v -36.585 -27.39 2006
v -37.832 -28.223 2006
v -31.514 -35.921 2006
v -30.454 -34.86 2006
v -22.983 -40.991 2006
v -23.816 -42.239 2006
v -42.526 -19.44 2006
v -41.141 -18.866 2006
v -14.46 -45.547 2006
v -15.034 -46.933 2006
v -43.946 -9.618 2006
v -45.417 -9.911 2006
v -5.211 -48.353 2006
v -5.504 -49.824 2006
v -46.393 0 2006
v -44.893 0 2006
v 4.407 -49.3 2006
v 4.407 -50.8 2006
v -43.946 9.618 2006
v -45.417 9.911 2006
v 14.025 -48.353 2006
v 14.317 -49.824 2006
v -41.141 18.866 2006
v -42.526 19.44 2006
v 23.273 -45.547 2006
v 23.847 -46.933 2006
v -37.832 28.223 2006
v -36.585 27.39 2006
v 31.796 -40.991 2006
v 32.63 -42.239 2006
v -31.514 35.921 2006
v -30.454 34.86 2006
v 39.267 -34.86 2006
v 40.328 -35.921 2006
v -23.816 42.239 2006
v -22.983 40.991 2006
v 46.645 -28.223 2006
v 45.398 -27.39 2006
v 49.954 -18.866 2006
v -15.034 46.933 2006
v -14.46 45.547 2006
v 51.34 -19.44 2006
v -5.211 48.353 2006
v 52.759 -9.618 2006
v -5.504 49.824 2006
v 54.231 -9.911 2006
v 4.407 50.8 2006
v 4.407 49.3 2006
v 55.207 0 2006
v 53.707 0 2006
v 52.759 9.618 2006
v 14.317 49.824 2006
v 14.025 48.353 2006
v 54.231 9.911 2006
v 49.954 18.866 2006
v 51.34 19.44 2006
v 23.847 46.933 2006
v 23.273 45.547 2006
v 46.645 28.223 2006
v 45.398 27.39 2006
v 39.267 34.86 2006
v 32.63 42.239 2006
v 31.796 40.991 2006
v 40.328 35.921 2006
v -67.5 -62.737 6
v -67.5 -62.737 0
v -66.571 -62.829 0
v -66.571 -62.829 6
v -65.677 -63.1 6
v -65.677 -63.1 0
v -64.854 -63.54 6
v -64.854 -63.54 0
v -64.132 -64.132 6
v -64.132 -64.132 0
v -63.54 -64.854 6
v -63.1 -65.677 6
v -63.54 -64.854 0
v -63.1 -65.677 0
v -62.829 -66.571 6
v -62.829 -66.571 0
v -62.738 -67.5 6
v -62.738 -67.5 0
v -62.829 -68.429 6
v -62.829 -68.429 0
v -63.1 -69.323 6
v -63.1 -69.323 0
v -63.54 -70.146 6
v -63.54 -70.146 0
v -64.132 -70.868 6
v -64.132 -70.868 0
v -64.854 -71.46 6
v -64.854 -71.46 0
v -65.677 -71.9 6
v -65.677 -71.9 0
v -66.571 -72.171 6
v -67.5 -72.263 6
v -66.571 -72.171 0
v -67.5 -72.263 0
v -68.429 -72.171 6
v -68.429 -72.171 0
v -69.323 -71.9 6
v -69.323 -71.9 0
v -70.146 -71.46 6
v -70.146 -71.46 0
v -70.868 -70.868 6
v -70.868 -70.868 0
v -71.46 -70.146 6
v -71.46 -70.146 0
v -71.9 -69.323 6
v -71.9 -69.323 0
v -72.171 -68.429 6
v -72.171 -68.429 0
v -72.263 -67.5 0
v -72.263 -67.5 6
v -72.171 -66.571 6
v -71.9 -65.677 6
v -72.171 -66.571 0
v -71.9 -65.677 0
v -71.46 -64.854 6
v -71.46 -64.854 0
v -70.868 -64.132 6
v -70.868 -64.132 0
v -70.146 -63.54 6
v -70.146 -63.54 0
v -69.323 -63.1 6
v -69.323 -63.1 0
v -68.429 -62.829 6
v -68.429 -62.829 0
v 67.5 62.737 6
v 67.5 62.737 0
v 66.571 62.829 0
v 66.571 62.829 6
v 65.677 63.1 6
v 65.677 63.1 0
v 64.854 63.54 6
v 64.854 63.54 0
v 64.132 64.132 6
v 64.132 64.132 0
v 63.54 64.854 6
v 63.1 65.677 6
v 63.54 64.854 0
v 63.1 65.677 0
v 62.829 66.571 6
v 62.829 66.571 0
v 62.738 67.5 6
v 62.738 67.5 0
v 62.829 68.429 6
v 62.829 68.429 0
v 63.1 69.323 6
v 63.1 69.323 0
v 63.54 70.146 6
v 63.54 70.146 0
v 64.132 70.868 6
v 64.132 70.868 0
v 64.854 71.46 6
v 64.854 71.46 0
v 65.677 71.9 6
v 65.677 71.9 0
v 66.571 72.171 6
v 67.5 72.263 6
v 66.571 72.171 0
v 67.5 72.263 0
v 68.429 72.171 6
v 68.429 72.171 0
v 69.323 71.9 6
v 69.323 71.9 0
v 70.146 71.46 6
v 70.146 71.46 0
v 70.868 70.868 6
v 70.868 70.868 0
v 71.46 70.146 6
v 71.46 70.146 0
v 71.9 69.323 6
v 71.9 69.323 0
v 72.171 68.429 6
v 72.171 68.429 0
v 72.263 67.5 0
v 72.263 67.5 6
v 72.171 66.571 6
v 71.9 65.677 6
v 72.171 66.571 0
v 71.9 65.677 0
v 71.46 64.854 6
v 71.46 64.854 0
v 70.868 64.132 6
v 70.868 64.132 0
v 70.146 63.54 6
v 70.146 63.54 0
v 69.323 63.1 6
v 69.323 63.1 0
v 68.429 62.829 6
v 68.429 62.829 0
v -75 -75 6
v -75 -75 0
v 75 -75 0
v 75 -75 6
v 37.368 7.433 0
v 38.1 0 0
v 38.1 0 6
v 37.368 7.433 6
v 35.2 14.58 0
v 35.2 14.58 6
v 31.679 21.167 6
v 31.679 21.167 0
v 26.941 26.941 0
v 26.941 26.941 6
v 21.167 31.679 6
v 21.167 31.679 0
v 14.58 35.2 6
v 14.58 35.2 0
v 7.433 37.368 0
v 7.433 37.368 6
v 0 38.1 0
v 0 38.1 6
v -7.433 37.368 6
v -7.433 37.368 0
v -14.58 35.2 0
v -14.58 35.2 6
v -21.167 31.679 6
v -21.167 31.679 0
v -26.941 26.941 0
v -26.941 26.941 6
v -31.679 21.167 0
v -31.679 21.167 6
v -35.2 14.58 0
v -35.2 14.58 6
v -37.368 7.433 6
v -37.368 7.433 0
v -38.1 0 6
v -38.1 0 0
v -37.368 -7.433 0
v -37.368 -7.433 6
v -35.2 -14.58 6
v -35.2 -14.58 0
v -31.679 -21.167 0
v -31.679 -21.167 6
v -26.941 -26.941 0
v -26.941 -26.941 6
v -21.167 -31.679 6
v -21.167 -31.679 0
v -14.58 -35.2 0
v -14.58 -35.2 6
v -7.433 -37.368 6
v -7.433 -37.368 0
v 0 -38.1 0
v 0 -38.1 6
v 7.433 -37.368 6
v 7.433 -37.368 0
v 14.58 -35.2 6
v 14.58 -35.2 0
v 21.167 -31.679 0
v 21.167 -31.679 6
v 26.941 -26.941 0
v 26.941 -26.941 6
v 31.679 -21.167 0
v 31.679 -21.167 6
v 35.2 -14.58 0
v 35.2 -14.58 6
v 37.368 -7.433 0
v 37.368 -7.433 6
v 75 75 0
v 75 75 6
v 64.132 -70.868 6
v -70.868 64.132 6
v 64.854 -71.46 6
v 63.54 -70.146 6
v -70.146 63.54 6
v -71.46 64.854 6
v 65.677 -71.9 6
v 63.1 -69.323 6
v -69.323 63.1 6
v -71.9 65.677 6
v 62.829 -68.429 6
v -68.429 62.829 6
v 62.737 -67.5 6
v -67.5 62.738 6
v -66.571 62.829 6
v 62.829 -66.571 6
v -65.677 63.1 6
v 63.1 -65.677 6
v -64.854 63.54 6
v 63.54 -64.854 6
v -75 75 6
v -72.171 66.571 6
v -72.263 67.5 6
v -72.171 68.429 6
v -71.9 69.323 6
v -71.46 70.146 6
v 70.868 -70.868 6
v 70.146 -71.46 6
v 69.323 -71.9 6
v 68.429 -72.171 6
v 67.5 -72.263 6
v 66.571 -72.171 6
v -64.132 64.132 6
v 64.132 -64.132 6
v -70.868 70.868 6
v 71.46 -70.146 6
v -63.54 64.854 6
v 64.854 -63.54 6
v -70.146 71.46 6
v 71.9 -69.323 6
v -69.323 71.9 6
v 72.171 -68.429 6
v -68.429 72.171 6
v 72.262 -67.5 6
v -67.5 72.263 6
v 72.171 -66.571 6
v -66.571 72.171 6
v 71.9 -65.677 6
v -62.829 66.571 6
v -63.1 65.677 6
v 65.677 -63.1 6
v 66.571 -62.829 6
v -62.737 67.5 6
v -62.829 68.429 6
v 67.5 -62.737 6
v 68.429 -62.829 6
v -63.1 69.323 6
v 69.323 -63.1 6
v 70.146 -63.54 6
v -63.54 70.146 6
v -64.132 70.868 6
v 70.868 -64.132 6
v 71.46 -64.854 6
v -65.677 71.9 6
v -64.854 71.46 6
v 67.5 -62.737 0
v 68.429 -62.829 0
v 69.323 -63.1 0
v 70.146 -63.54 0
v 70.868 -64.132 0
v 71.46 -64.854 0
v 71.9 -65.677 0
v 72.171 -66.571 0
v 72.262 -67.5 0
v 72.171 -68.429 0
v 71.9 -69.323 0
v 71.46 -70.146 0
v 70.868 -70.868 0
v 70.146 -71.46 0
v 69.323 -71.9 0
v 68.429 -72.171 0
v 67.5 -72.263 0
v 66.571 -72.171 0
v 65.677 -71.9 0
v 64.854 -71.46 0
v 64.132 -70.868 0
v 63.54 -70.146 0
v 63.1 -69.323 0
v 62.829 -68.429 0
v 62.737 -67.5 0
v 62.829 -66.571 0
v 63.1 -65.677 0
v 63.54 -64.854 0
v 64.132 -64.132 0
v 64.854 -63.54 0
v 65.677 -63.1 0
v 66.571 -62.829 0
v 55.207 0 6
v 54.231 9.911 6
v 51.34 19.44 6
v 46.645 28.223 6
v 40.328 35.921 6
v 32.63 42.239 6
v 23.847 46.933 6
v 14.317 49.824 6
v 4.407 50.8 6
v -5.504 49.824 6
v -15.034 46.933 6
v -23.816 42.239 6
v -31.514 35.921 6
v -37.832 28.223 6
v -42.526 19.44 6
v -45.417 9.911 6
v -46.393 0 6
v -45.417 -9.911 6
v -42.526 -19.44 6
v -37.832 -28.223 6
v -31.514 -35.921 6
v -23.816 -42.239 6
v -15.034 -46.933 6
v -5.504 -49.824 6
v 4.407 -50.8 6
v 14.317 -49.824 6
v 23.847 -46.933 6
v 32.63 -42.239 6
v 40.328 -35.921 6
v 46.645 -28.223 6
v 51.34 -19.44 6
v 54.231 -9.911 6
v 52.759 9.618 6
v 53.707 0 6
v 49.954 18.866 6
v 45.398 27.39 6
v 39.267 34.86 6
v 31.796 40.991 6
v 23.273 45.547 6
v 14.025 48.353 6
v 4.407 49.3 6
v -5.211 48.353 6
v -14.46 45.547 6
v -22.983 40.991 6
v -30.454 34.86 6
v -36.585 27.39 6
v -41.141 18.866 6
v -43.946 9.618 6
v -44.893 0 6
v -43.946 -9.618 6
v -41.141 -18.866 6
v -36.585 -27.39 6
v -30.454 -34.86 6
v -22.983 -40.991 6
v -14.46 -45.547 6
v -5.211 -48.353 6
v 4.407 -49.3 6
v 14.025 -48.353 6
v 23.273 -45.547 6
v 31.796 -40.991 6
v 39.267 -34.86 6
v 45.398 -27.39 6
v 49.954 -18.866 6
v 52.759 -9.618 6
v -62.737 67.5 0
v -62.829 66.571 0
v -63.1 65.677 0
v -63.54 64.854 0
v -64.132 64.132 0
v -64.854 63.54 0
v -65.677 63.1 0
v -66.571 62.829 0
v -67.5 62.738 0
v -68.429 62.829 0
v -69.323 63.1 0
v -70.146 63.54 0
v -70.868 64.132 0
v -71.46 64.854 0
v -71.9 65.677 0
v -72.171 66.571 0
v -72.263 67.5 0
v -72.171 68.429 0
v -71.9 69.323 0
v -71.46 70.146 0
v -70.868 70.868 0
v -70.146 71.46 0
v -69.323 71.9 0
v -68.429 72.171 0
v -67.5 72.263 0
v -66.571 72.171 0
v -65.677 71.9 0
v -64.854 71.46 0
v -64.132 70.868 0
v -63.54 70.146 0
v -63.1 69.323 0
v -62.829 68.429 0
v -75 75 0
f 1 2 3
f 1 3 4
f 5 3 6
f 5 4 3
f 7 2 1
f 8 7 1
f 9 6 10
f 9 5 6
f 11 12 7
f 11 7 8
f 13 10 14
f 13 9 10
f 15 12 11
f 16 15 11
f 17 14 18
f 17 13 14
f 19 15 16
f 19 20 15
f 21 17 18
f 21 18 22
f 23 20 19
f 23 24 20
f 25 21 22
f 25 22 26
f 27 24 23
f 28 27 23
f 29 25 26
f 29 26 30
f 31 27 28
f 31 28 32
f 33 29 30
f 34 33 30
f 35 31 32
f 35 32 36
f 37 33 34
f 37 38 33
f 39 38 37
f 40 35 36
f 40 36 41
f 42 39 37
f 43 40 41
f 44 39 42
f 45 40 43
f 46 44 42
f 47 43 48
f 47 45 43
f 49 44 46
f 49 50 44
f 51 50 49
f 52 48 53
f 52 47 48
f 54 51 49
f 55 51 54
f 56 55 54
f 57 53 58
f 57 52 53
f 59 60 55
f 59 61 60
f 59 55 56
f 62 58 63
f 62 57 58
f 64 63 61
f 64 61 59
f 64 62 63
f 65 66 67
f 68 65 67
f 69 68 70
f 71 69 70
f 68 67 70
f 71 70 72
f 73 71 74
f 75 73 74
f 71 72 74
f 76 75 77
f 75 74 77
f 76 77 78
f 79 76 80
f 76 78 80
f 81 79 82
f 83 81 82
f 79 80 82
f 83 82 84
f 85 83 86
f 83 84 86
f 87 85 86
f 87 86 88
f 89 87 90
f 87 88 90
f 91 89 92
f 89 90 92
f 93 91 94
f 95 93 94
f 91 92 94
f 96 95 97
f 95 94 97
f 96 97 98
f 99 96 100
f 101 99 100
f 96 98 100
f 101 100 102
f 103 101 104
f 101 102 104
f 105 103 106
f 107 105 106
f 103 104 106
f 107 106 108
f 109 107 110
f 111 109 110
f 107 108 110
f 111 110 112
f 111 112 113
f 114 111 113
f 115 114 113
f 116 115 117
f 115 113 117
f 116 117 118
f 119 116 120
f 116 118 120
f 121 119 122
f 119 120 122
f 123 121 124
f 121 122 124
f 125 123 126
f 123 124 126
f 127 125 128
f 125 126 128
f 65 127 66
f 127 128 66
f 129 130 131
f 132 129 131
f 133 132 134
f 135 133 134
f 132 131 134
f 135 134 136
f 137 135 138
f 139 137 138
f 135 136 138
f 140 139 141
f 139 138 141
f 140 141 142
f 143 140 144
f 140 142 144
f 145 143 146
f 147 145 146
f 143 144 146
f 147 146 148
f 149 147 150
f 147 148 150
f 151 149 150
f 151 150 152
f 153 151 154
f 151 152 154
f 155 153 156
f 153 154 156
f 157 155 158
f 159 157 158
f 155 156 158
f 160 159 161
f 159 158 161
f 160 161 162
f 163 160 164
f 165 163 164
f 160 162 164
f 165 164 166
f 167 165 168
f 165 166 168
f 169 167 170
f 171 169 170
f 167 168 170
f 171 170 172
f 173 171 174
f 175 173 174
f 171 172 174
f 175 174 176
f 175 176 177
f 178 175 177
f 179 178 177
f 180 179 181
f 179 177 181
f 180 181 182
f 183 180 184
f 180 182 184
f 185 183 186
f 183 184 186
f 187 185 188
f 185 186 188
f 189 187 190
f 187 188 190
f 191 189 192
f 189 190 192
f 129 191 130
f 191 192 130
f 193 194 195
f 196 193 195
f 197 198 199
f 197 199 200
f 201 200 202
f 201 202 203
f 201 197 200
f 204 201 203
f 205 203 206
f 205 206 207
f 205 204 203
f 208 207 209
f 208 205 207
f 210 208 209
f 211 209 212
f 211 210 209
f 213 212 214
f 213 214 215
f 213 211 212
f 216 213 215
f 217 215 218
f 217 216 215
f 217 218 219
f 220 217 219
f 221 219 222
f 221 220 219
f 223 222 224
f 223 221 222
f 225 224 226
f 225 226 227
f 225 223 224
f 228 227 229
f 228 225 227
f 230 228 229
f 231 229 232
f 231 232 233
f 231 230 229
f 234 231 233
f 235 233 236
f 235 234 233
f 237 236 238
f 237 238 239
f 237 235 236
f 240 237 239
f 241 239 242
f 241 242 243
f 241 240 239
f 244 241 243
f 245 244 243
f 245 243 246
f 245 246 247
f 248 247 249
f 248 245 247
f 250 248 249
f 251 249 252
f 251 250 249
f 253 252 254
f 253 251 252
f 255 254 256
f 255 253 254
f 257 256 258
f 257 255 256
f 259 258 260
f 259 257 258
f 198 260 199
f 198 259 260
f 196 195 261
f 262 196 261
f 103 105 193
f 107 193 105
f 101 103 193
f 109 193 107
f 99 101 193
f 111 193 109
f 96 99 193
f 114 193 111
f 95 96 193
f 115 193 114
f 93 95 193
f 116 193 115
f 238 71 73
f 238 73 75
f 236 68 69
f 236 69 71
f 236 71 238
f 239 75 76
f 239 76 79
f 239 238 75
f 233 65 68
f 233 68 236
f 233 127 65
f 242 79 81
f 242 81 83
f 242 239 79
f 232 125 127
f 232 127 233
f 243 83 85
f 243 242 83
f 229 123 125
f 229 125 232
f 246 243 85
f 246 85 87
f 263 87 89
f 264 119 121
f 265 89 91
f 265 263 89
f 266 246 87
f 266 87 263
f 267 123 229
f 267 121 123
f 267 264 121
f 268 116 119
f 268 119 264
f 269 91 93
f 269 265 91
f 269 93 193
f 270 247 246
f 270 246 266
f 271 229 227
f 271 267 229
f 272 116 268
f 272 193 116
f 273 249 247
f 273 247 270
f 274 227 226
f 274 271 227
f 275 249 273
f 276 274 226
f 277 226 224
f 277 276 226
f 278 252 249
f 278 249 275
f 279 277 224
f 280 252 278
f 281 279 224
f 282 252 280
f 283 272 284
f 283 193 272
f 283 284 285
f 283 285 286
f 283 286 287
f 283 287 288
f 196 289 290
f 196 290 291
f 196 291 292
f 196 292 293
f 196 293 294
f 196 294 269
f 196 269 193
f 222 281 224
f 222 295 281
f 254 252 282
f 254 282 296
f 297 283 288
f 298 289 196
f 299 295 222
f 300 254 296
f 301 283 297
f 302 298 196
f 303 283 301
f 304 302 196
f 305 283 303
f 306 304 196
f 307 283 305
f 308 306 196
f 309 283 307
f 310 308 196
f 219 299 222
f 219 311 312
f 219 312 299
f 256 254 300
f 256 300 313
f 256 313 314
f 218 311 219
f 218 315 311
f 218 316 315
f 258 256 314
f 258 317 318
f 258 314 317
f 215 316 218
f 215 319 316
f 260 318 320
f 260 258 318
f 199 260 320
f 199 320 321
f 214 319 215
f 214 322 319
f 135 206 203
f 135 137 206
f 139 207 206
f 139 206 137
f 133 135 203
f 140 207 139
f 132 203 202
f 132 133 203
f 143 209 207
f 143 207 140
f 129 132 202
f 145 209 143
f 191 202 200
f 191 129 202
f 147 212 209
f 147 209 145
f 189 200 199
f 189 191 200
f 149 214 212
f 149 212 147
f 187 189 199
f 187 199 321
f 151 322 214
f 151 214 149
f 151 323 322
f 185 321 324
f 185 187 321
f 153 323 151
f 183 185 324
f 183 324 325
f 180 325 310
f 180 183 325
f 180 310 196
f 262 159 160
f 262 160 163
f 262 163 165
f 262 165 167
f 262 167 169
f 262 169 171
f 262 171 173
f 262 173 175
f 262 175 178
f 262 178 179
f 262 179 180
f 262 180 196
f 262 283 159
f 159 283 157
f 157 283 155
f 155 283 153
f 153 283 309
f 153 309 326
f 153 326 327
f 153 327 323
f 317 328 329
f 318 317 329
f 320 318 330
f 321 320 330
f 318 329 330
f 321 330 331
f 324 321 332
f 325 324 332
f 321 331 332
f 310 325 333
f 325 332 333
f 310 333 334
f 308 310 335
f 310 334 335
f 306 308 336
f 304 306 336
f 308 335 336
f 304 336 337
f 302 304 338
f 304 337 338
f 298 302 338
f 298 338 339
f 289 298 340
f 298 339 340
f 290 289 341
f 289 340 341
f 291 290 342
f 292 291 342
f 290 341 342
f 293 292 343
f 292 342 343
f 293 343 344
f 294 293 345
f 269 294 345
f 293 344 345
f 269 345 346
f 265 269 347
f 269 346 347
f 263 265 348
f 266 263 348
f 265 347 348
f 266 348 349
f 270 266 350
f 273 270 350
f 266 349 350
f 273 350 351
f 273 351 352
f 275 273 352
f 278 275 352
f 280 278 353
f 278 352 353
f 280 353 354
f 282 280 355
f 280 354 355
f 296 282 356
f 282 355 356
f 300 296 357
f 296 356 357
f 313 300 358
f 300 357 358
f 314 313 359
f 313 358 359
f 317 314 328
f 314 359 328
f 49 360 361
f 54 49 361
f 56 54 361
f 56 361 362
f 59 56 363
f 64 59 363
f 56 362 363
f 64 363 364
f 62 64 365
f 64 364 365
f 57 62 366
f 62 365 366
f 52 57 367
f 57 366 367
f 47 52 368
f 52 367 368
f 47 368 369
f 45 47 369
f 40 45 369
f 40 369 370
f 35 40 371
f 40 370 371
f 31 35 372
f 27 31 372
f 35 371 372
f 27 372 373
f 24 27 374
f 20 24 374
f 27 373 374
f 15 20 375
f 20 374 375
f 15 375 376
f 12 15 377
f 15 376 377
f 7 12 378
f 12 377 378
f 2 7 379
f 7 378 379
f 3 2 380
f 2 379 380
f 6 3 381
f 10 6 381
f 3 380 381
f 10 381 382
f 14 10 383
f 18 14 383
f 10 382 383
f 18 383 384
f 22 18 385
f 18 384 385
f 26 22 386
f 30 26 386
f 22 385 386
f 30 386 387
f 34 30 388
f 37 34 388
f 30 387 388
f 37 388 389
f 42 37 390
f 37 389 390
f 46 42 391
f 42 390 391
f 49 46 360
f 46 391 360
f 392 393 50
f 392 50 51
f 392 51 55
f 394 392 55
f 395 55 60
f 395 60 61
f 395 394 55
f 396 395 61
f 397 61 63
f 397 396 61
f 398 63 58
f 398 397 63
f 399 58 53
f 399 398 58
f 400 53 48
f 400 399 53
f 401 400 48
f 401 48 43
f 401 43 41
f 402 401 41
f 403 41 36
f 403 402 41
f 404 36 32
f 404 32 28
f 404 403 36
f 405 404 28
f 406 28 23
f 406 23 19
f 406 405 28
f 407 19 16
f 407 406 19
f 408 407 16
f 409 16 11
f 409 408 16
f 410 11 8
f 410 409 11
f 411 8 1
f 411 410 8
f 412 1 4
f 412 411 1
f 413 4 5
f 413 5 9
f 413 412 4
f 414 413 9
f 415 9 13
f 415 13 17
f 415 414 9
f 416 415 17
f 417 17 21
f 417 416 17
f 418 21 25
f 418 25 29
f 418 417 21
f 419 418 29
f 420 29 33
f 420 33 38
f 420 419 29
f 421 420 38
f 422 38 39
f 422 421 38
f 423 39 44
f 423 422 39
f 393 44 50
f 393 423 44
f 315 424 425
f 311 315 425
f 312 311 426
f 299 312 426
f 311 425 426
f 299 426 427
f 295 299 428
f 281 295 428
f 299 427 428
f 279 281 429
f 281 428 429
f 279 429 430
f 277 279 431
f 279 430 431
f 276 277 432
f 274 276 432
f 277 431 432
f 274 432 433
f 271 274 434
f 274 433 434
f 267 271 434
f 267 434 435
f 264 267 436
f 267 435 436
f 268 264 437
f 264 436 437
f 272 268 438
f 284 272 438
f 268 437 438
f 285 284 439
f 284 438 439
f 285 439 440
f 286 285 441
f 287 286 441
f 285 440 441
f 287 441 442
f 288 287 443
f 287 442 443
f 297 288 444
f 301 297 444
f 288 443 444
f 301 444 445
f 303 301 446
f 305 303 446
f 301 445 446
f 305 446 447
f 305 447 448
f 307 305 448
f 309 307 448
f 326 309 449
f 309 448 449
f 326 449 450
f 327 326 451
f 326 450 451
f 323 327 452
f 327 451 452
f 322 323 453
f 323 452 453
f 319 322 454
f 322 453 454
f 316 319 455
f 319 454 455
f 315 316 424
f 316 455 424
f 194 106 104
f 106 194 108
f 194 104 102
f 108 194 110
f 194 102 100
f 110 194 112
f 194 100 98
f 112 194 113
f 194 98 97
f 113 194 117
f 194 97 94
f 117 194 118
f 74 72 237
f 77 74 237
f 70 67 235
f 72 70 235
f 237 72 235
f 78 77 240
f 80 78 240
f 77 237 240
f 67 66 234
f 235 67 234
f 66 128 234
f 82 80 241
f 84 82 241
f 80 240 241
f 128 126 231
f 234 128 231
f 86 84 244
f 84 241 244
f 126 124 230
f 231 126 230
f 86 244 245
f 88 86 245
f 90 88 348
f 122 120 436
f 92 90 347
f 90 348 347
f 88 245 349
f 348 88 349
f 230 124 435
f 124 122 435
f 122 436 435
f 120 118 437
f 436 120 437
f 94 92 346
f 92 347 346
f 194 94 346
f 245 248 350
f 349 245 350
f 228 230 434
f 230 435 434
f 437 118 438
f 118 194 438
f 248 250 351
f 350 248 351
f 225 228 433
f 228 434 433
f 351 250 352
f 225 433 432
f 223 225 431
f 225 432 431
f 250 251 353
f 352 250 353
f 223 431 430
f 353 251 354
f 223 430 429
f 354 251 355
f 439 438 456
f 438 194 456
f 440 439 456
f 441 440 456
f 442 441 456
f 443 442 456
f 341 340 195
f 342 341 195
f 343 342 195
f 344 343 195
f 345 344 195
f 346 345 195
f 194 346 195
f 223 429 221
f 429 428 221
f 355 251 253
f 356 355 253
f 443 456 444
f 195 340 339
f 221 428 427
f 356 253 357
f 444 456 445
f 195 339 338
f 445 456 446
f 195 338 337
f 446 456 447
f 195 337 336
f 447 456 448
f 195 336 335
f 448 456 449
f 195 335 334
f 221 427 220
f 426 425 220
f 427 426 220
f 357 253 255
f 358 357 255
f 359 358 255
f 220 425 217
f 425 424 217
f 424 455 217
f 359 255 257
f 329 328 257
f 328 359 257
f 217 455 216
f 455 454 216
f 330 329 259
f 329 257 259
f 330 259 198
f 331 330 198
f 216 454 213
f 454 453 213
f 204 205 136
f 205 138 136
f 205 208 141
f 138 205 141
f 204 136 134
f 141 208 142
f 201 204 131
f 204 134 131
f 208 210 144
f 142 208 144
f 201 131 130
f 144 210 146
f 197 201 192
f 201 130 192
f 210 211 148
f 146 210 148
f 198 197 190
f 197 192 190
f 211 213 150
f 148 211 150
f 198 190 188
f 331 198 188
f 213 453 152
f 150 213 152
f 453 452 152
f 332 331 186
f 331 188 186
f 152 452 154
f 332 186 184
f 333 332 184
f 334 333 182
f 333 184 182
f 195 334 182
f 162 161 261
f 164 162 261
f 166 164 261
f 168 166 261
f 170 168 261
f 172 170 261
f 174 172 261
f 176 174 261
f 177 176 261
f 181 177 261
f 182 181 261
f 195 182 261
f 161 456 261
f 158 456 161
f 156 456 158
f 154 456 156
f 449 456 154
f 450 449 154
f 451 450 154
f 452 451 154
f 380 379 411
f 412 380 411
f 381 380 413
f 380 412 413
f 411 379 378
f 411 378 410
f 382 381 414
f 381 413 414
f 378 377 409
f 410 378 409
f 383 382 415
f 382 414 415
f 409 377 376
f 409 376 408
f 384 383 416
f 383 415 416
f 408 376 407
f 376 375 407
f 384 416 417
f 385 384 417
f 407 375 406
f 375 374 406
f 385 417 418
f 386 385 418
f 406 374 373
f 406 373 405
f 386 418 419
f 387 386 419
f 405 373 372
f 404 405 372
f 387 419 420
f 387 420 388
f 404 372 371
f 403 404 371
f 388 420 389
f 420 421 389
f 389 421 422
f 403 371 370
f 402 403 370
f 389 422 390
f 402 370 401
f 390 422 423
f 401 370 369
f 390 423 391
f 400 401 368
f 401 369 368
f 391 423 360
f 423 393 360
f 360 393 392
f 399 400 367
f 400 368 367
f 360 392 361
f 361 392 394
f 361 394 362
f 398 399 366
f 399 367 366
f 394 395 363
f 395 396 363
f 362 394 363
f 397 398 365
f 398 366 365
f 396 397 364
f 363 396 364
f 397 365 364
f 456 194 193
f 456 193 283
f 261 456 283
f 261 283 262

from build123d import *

# Parameters (mm, degrees)
F0_W     = 150
F0_H     = 150
F0_R     = 38.1
F1_DEPTH = 6
F0_R_2   = 4.7625
F2_R     = 50.8
F2_R_2   = 49.3
F4_DEPTH = 2000


with BuildPart() as f1:
    # F0 (on Top) → F1 (new body)
    with BuildSketch(Plane.XY):
        Rectangle(F0_W, F0_H)
        with BuildLine():
            Line((62.7375, -67.5), (-62.7375, -67.5))
            ThreePointArc((-62.7375, -67.5), (-70.8675960454, -70.8675960454), (-67.5, -62.7375))
            Line((-67.5, -62.7375), (-67.5, 62.7375))
            ThreePointArc((-67.5, 62.7375), (-70.8675960454, 70.8675960454), (-62.7375, 67.5))
            Line((-62.7375, 67.5), (62.7375, 67.5))
            ThreePointArc((62.7375, 67.5), (67.5, 72.2625), (72.2625, 67.5))
            ThreePointArc((72.2625, 67.5), (70.8675960454, 64.1324039546), (67.5, 62.7375))
            Line((67.5, 62.7375), (67.5, -62.7375))
            ThreePointArc((67.5, -62.7375), (70.8675960454, -64.1324039546), (72.2625, -67.5))
            ThreePointArc((72.2625, -67.5), (67.5, -72.2625), (62.7375, -67.5))
        make_face(mode=Mode.SUBTRACT)
        with BuildLine():
            ThreePointArc((-67.5, -62.7375), (-64.1324039546, -64.1324039546), (-62.7375, -67.5))
            Line((-62.7375, -67.5), (62.7375, -67.5))
            ThreePointArc((62.7375, -67.5), (64.1324039546, -64.1324039546), (67.5, -62.7375))
            Line((67.5, -62.7375), (67.5, 62.7375))
            ThreePointArc((67.5, 62.7375), (64.1324039546, 64.1324039546), (62.7375, 67.5))
            Line((62.7375, 67.5), (-62.7375, 67.5))
            ThreePointArc((-62.7375, 67.5), (-64.1324039546, 64.1324039546), (-67.5, 62.7375))
            Line((-67.5, 62.7375), (-67.5, -62.7375))
        make_face()
        Circle(F0_R, mode=Mode.SUBTRACT)
    extrude(amount=F1_DEPTH)


with BuildPart() as f1b:
    # F0 (on Top) → F1, piece 2 (new body)
    with BuildSketch(Plane.XY):
        with Locations((202.5, -67.5)):
            Circle(F0_R_2)
    extrude(amount=F1_DEPTH)


with BuildPart() as f4:
    # F2 (on face) → F4 (new body)
    with BuildSketch(Plane.XY.offset(6)):
        with Locations((4.4067243471, 0)):
            Circle(F2_R)
        with Locations((4.4067243471, 0)):
            Circle(F2_R_2, mode=Mode.SUBTRACT)
    extrude(amount=F4_DEPTH)


solid = Compound([f1.part, f4.part])
